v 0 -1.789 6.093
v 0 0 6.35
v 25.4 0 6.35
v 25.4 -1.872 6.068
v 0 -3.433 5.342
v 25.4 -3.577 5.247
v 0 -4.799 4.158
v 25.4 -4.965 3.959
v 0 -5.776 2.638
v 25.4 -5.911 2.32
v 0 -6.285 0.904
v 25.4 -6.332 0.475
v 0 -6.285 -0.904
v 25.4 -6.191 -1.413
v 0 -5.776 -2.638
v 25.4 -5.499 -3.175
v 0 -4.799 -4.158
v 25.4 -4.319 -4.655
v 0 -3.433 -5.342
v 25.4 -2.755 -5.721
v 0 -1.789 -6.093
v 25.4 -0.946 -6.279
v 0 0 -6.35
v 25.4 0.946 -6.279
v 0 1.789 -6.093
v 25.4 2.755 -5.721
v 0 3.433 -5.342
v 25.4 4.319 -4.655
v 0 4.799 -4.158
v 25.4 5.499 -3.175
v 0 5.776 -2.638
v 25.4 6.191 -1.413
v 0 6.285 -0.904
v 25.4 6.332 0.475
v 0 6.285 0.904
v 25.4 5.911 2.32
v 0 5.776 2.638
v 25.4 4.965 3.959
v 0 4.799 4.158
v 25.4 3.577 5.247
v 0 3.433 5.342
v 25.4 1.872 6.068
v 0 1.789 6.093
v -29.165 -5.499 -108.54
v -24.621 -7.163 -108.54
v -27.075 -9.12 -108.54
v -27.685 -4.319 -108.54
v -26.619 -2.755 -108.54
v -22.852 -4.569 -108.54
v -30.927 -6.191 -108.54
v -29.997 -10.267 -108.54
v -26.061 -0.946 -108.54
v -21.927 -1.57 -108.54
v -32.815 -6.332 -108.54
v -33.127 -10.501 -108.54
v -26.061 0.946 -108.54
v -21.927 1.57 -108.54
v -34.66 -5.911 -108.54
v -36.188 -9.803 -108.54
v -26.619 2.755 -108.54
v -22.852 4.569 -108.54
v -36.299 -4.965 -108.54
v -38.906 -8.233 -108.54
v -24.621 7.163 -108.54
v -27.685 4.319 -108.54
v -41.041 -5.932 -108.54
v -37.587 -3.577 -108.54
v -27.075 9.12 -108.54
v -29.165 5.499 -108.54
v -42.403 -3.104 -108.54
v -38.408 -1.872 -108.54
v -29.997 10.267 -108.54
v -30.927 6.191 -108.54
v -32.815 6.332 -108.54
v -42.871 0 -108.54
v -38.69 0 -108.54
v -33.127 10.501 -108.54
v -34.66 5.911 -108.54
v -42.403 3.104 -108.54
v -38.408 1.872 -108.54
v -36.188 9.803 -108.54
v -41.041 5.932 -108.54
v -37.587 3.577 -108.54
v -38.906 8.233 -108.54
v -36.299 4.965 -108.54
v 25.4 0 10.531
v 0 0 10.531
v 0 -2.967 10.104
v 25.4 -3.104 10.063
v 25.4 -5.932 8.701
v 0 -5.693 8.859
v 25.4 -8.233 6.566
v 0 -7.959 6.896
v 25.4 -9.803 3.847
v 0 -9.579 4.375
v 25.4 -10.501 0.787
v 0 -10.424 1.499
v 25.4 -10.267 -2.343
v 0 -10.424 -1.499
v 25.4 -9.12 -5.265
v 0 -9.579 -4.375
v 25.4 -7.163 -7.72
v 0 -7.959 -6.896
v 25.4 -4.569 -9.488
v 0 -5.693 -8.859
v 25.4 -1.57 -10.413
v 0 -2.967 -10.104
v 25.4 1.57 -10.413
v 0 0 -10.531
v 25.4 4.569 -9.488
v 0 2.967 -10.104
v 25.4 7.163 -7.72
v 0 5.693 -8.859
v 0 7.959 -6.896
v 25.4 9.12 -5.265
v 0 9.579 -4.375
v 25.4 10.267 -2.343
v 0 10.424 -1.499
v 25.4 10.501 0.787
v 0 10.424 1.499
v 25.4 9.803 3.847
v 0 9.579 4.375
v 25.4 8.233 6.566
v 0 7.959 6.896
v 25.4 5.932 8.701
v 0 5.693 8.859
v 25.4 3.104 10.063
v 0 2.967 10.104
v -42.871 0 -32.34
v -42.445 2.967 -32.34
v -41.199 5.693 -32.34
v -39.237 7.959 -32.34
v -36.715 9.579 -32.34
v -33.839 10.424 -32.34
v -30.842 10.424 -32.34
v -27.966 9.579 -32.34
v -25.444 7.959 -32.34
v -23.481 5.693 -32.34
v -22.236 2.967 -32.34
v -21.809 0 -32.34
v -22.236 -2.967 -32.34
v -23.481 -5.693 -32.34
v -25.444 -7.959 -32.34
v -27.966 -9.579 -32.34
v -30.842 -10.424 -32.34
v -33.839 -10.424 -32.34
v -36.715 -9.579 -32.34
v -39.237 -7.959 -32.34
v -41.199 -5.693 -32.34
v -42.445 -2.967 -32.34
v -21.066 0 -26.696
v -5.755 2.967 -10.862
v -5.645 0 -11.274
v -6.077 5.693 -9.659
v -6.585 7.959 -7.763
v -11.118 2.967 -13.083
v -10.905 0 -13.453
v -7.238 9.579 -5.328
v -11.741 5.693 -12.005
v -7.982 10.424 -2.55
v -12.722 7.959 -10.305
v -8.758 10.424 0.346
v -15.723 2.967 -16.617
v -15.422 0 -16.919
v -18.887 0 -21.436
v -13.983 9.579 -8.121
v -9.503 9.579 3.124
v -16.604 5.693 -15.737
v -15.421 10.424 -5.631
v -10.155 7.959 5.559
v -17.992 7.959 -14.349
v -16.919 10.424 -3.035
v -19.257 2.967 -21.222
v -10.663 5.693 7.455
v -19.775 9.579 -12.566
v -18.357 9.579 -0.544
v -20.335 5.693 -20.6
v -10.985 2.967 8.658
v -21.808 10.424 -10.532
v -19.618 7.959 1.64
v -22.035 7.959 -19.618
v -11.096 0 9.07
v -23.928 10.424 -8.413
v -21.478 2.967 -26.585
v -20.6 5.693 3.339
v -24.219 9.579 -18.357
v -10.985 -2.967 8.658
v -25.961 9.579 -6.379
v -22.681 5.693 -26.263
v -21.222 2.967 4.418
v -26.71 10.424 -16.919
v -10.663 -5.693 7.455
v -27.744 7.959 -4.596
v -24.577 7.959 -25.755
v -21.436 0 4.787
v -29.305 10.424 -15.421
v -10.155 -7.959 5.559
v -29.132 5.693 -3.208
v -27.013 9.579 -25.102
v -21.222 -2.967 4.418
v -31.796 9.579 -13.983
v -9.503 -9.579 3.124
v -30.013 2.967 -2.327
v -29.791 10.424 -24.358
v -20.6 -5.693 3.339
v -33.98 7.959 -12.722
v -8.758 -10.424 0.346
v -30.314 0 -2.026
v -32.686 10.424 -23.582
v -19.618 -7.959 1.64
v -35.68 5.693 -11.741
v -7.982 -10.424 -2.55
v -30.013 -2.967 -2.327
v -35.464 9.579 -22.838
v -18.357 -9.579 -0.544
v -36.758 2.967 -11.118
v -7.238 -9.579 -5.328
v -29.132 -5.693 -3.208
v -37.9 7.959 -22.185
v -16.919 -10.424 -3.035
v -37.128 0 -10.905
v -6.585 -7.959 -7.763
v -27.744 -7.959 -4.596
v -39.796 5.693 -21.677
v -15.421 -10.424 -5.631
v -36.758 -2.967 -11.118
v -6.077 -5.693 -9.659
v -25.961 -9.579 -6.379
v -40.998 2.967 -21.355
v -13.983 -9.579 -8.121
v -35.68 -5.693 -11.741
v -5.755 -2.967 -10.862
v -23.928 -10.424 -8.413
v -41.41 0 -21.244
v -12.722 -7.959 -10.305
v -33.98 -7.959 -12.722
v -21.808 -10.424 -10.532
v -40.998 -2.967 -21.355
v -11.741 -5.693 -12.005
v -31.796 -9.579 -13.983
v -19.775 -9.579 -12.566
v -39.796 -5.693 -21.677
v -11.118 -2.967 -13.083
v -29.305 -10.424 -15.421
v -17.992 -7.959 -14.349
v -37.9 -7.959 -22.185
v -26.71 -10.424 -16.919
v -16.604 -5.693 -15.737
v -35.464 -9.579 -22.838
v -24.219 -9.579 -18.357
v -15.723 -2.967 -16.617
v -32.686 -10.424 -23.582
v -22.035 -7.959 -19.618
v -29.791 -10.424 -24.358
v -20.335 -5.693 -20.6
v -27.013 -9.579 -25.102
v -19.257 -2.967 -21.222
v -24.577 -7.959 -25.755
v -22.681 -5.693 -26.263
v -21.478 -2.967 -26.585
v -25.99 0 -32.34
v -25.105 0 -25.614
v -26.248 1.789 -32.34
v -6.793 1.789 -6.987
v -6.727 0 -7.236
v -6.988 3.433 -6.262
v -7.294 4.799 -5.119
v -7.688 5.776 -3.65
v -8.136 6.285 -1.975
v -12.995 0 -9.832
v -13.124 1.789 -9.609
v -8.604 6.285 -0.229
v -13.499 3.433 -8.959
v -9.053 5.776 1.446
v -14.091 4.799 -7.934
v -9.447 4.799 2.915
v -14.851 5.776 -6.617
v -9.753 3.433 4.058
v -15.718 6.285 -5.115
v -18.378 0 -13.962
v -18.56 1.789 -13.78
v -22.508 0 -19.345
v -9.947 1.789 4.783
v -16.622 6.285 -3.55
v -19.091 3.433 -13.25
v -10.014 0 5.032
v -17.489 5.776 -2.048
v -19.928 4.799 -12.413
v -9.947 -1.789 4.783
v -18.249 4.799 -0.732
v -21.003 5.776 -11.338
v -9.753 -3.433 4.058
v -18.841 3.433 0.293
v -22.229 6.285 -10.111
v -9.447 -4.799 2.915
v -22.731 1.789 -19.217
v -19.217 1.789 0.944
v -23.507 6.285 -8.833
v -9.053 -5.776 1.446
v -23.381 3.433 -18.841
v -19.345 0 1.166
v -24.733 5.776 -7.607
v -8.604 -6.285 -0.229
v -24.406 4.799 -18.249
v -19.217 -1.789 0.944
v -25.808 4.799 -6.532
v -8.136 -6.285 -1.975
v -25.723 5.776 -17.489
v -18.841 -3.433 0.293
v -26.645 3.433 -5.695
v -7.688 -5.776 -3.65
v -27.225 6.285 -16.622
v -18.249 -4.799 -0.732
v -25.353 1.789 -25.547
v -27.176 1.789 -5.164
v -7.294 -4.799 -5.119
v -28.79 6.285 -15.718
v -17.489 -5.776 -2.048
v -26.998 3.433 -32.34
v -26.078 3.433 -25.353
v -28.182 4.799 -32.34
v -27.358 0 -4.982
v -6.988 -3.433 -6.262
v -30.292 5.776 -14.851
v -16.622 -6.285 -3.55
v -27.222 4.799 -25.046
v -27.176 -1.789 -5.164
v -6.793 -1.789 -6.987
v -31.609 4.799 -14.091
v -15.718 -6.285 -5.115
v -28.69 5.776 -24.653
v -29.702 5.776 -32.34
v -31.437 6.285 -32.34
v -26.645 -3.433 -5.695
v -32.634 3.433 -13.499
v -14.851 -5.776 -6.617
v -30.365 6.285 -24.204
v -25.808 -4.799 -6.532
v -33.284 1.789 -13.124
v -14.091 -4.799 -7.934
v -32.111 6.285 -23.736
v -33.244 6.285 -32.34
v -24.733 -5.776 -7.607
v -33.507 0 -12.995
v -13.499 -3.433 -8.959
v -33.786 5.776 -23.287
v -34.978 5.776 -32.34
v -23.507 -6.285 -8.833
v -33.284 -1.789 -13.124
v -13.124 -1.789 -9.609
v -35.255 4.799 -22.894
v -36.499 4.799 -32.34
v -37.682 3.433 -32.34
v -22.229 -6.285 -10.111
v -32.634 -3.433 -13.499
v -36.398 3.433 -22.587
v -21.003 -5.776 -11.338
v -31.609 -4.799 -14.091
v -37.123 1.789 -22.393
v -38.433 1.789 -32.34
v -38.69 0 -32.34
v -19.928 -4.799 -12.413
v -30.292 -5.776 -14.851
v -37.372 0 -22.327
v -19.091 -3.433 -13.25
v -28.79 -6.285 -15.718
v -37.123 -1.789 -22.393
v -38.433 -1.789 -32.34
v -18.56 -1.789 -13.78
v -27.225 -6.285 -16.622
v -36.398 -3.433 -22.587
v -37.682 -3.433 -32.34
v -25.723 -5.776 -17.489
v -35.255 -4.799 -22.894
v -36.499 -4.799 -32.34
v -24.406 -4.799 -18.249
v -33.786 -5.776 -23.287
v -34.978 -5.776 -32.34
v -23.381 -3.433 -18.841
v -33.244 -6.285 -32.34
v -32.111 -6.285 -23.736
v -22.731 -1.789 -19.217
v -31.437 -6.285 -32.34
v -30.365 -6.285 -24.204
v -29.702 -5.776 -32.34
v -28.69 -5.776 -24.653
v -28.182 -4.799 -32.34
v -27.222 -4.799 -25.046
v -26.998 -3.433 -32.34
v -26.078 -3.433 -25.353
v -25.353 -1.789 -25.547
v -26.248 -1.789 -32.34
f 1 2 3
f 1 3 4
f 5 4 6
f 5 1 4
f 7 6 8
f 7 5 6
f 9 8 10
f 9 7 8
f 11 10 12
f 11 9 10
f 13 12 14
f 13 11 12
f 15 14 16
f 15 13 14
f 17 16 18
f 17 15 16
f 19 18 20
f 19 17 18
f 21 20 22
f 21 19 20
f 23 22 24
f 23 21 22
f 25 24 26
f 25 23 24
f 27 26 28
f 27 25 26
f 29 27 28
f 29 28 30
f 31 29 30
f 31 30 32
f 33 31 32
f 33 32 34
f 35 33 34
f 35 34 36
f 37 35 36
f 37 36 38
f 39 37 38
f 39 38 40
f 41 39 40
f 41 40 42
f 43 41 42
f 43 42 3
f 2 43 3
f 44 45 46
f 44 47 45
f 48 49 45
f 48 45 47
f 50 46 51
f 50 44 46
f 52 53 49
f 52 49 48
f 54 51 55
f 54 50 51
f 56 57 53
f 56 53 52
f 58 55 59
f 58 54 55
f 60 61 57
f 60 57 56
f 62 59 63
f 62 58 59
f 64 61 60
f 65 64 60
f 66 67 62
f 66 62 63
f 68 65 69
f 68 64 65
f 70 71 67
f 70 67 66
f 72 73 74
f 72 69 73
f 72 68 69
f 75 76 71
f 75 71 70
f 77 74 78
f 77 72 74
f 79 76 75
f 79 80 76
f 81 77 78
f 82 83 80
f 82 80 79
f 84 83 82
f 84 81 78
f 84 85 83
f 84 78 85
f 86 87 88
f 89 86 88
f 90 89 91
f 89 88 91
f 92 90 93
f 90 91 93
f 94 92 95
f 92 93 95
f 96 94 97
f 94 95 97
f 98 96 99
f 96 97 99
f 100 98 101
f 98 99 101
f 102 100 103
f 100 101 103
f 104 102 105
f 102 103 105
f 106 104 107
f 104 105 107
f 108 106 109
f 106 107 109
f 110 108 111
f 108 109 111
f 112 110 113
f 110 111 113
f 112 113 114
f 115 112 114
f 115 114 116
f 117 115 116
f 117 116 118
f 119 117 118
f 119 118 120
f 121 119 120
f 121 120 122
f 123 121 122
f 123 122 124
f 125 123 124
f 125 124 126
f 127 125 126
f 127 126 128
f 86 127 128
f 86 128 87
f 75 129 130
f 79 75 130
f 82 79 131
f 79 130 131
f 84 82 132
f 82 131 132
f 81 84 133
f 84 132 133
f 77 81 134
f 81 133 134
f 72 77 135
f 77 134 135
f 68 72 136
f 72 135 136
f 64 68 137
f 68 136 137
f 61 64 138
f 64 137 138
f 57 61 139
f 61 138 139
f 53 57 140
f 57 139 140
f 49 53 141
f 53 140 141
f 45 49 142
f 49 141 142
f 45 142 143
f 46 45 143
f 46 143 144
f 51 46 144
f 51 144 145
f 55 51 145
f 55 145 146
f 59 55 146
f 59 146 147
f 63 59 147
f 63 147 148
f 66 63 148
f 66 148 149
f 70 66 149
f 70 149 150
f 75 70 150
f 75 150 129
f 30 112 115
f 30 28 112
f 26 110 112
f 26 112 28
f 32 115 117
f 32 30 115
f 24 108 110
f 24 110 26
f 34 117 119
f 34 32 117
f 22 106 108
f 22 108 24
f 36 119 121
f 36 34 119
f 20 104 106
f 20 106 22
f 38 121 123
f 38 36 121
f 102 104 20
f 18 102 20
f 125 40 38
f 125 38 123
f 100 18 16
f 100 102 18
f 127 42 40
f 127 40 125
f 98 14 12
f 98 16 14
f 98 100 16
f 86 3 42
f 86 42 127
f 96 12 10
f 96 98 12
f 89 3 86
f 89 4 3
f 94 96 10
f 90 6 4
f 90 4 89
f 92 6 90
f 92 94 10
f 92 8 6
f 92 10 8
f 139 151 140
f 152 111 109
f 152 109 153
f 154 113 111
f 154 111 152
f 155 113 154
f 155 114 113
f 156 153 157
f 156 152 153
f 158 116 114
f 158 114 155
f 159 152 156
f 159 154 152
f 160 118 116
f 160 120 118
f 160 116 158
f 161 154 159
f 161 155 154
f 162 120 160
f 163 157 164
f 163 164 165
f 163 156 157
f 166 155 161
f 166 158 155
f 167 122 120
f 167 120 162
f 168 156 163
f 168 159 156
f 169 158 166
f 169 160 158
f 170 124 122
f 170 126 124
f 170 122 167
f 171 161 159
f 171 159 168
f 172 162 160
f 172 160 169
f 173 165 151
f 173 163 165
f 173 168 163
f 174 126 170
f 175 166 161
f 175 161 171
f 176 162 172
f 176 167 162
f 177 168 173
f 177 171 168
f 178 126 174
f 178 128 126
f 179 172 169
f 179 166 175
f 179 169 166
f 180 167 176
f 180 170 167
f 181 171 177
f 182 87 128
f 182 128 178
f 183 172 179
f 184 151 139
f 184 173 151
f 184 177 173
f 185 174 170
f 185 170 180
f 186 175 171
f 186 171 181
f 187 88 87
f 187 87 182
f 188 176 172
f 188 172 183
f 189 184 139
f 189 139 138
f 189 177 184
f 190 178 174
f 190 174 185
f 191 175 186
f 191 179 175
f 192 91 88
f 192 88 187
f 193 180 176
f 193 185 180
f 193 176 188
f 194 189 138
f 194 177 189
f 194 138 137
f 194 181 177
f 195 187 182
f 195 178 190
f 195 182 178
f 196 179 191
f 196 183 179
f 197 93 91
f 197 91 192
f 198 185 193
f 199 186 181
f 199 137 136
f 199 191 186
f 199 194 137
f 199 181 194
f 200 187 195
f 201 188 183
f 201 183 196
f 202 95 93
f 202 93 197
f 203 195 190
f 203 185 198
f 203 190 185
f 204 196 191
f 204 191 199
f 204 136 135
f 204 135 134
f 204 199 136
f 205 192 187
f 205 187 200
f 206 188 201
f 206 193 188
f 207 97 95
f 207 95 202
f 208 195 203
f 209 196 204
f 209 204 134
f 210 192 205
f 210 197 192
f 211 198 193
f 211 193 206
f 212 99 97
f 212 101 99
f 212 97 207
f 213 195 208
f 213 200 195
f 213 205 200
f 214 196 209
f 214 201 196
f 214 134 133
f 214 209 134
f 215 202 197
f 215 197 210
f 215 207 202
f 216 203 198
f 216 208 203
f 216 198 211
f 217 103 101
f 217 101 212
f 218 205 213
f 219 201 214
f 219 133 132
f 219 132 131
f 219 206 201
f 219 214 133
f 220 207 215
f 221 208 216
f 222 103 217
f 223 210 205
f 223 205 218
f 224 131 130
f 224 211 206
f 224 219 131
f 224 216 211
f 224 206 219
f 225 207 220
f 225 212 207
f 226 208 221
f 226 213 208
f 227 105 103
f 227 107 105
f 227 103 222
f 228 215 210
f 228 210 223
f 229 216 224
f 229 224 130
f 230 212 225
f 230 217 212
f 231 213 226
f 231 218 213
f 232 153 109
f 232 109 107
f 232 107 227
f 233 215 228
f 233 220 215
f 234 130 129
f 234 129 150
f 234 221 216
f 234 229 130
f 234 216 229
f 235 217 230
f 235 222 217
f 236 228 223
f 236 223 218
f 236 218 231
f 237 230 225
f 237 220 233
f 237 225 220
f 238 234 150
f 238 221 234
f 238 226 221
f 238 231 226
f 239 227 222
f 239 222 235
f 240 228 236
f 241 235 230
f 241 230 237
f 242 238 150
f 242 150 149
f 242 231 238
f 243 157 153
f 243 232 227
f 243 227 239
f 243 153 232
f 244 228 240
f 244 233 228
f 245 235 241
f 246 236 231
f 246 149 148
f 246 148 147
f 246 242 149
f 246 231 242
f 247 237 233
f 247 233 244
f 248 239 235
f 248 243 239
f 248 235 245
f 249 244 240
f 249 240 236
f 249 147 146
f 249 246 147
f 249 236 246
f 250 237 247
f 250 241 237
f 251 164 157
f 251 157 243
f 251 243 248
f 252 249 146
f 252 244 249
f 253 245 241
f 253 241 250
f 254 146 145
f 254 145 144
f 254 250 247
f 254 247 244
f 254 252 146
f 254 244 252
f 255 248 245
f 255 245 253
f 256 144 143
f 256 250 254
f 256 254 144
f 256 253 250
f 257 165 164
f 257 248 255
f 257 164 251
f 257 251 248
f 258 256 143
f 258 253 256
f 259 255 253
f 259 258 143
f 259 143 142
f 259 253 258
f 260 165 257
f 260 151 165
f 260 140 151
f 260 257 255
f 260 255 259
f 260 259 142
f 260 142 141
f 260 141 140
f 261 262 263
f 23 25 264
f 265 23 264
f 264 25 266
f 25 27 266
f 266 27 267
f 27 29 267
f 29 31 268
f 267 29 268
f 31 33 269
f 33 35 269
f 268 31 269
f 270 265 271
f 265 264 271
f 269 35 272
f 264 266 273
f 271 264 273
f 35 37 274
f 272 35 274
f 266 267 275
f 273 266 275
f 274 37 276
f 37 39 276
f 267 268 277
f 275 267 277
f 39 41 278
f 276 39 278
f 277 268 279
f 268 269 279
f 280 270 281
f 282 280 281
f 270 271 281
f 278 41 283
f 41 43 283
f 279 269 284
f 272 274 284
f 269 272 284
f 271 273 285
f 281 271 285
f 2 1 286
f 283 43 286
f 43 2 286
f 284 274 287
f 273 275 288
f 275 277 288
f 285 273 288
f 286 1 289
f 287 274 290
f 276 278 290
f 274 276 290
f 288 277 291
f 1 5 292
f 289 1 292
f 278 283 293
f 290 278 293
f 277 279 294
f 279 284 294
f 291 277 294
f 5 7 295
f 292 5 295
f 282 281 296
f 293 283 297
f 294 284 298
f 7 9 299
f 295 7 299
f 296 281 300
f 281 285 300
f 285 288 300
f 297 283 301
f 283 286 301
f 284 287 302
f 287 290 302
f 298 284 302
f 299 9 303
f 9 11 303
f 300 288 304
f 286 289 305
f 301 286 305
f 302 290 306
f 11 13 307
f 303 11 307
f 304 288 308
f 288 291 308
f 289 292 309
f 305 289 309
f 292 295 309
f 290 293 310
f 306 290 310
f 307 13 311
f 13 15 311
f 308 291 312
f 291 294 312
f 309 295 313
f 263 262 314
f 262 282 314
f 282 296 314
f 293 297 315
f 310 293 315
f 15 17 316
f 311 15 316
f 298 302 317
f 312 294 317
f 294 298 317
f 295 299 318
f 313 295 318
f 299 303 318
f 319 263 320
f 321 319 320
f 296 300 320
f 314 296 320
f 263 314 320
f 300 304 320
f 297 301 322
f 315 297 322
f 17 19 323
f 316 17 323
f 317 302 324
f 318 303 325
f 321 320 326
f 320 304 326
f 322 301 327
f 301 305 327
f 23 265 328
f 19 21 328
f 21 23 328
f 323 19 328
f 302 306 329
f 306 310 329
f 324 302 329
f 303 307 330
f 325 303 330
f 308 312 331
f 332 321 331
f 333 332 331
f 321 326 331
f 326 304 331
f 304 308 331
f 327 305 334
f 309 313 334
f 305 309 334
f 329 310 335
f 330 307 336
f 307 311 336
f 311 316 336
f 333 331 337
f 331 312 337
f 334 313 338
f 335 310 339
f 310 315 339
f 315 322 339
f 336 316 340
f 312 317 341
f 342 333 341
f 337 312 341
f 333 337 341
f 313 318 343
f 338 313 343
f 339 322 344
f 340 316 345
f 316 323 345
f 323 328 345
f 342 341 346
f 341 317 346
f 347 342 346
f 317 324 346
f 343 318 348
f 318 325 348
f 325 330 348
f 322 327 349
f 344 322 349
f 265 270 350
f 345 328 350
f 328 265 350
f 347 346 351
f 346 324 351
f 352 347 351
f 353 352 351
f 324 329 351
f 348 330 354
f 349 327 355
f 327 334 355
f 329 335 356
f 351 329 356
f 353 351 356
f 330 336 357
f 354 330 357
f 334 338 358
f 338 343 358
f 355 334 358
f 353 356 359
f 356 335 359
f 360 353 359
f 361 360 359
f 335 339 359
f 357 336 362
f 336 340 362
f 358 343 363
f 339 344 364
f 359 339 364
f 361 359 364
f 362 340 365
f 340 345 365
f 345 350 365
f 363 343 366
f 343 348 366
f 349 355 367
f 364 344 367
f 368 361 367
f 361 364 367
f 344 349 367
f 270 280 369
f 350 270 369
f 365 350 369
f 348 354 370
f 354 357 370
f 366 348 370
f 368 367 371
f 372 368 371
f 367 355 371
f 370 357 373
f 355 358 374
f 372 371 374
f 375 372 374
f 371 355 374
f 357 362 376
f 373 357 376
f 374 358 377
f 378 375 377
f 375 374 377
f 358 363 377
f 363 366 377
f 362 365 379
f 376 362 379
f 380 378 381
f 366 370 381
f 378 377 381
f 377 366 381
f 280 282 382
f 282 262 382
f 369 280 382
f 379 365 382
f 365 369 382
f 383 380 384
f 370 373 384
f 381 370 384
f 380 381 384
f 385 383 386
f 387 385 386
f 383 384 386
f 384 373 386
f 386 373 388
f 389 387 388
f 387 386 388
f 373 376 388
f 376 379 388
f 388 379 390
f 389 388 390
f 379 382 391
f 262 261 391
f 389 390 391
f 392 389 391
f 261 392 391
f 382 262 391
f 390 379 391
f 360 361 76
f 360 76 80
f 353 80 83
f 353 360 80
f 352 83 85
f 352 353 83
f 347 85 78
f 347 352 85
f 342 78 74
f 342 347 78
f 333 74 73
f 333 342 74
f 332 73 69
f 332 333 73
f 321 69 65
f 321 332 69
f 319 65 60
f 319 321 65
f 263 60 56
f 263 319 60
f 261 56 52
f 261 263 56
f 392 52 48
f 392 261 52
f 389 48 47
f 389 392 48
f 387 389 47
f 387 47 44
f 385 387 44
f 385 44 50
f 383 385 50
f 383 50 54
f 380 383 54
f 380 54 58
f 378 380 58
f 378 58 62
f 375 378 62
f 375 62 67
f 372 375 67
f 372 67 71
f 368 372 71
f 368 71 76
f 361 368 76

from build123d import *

# Parameters (mm, degrees)
SKETCH2_R           = 10.530885837
SKETCH2_R_2         = 6.35
SKETCH3_R           = 10.530885837
SKETCH3_R_2         = 6.35
BOSS_EXTRUDE1_DEPTH = 76.2
SKETCH4_R           = 10.530885837
SKETCH4_R_2         = 6.35
BOSS_EXTRUDE2_DEPTH = 25.4


with BuildPart() as part:
    # Sweep1: sweep along a path in Sketch1
    with BuildLine(Plane(origin=(0, 0, 0), x_dir=(1, 0, 0), z_dir=(0, 1, 0))) as sweep1_path:
        ThreePointArc((0, 0), (-22.86803443, 9.472250006), (-32.340284436, 32.340284436))
    # Sketch2 → Sweep1 (sweep)
    with BuildSketch(Plane(origin=(0, 0, 0), x_dir=(0, 0, -1), z_dir=(1, 0, 0))):
        Circle(SKETCH2_R)
        Circle(SKETCH2_R_2, mode=Mode.SUBTRACT)
    sweep(path=sweep1_path.line)

    # Sketch3 → Boss-Extrude1 (add)
    with BuildSketch(Plane(origin=(0, 0, -32.340284436), x_dir=(-1, 0, 0), z_dir=(0, 0, -1))):
        with Locations((32.340284436, 0)):
            Circle(SKETCH3_R)
        with Locations((32.340284436, 0)):
            Circle(SKETCH3_R_2, mode=Mode.SUBTRACT)
    extrude(amount=BOSS_EXTRUDE1_DEPTH)

    # Sketch4 → Boss-Extrude2 (add)
    with BuildSketch(Plane(origin=(0, 0, 0), x_dir=(0, 0, -1), z_dir=(1, 0, 0))):
        with Locations(Location((0, 0, 0), (0, 0, 180))):
            Circle(SKETCH4_R)
        with Locations(Location((0, 0, 0), (0, 0, 180))):
            Circle(SKETCH4_R_2, mode=Mode.SUBTRACT)
    extrude(amount=BOSS_EXTRUDE2_DEPTH)


solid = part.part
